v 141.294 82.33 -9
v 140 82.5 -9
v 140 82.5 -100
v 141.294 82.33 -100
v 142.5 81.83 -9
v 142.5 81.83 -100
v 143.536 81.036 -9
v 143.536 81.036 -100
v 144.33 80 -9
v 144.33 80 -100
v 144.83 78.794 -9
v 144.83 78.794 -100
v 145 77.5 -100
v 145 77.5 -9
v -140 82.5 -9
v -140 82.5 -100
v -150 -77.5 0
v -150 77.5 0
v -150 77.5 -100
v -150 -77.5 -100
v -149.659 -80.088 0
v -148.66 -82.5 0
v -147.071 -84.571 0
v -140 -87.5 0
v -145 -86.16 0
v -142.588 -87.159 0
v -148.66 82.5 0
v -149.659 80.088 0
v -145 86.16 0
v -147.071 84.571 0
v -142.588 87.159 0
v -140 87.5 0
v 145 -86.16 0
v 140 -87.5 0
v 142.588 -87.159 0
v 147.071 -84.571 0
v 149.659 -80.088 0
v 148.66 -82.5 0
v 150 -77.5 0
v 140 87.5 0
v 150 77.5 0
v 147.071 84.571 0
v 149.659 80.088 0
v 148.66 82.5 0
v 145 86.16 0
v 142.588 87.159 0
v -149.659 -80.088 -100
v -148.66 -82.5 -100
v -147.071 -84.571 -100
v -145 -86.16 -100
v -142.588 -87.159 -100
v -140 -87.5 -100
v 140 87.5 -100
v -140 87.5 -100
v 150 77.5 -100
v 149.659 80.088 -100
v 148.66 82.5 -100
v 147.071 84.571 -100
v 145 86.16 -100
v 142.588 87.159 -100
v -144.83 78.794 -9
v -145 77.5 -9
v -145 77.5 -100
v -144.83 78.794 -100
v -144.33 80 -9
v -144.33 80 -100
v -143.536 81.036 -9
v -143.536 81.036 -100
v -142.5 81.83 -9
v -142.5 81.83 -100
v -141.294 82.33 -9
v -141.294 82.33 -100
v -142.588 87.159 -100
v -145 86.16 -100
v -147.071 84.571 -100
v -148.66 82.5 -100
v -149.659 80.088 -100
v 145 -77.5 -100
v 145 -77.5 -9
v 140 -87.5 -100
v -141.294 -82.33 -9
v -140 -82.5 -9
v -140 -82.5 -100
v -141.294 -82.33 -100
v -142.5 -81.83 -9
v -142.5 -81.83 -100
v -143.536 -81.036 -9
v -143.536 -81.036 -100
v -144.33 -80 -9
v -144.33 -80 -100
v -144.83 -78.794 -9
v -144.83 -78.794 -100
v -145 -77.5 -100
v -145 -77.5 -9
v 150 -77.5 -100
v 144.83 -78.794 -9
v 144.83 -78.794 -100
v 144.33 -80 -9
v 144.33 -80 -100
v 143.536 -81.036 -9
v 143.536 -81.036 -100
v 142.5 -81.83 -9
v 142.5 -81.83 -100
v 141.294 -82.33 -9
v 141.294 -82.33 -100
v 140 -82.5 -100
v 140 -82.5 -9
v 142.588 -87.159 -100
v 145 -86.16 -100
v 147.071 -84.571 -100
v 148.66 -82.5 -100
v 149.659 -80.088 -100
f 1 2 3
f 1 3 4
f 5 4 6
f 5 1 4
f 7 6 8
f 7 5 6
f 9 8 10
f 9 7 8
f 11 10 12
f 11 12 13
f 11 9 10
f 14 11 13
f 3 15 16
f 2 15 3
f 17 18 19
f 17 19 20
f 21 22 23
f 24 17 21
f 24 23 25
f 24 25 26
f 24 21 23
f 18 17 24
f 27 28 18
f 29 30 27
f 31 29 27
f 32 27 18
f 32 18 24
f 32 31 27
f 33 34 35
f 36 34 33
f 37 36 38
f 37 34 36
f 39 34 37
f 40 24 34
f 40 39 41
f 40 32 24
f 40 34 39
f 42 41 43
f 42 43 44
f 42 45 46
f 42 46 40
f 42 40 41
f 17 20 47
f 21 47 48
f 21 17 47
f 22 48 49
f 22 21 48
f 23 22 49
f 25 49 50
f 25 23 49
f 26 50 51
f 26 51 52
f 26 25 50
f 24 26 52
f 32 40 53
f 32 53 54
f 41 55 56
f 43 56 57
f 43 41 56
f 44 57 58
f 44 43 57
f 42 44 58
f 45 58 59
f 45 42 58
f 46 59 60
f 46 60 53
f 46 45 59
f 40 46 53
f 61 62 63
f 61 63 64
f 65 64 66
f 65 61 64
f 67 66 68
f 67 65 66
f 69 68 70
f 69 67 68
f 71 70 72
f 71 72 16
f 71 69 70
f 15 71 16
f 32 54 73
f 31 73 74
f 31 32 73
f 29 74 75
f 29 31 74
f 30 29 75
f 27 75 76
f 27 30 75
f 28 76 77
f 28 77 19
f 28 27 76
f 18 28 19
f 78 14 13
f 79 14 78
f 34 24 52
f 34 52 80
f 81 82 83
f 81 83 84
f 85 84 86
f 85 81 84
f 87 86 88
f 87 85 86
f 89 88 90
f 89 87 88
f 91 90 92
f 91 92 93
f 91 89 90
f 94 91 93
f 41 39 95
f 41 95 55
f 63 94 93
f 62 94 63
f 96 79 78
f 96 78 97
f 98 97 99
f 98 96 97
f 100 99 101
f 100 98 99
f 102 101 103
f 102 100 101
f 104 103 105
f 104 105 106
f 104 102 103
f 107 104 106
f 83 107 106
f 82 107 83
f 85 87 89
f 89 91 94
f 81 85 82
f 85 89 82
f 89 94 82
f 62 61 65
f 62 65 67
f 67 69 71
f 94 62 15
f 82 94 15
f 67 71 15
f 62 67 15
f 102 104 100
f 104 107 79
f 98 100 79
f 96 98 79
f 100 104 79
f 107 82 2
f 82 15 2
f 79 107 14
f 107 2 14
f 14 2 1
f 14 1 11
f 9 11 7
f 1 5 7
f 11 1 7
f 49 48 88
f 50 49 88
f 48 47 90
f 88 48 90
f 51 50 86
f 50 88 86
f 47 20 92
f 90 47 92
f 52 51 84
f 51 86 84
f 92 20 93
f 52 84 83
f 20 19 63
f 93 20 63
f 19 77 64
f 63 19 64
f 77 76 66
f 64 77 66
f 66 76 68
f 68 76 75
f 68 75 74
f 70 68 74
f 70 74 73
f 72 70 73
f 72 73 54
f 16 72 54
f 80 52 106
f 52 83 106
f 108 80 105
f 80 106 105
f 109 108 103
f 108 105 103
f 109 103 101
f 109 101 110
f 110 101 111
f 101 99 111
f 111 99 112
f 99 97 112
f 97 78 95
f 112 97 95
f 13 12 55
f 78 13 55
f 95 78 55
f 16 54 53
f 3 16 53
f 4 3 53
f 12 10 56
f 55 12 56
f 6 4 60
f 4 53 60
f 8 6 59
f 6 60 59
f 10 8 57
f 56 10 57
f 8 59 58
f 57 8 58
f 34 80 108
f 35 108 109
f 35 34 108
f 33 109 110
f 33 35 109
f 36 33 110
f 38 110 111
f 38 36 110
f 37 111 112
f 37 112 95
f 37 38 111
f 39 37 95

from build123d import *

# Parameters (mm, degrees)
F1_DEPTH = 100
F2_DEPTH = 9


with BuildPart() as f1:
    # F0 (on Top) → F1 (new body)
    with BuildSketch(Plane.XY):
        with BuildLine():
            ThreePointArc((150, 77.5), (147.071068, 84.571068), (140, 87.5))
            Line((140, 87.5), (-140, 87.5))
            ThreePointArc((-140, 87.5), (-147.071068, 84.571068), (-150, 77.5))
            Line((-150, 77.5), (-150, -77.5))
            ThreePointArc((-150, -77.5), (-147.071068, -84.571068), (-140, -87.5))
            Line((-140, -87.5), (140, -87.5))
            ThreePointArc((140, -87.5), (147.071068, -84.571068), (150, -77.5))
            Line((150, -77.5), (150, 77.5))
        make_face()
        with BuildLine():
            ThreePointArc((140, 82.5), (143.535534, 81.035534), (145, 77.5))
            Line((145, 77.5), (145, -77.5))
            ThreePointArc((145, -77.5), (143.535534, -81.035534), (140, -82.5))
            Line((140, -82.5), (-140, -82.5))
            ThreePointArc((-140, -82.5), (-143.535534, -81.035534), (-145, -77.5))
            Line((-145, -77.5), (-145, 77.5))
            ThreePointArc((-145, 77.5), (-143.535534, 81.035534), (-140, 82.5))
            Line((-140, 82.5), (140, 82.5))
        make_face(mode=Mode.SUBTRACT)
    extrude(amount=-F1_DEPTH)

    # F0 (on Top) → F2 (join)
    with BuildSketch(Plane.XY):
        with BuildLine():
            Line((145, -77.5), (145, 77.5))
            ThreePointArc((145, 77.5), (143.535534, 81.035534), (140, 82.5))
            Line((140, 82.5), (-140, 82.5))
            ThreePointArc((-140, 82.5), (-143.535534, 81.035534), (-145, 77.5))
            Line((-145, 77.5), (-145, -77.5))
            ThreePointArc((-145, -77.5), (-143.535534, -81.035534), (-140, -82.5))
            Line((-140, -82.5), (140, -82.5))
            ThreePointArc((140, -82.5), (143.535534, -81.035534), (145, -77.5))
        make_face()
    extrude(amount=-F2_DEPTH)


solid = f1.part
